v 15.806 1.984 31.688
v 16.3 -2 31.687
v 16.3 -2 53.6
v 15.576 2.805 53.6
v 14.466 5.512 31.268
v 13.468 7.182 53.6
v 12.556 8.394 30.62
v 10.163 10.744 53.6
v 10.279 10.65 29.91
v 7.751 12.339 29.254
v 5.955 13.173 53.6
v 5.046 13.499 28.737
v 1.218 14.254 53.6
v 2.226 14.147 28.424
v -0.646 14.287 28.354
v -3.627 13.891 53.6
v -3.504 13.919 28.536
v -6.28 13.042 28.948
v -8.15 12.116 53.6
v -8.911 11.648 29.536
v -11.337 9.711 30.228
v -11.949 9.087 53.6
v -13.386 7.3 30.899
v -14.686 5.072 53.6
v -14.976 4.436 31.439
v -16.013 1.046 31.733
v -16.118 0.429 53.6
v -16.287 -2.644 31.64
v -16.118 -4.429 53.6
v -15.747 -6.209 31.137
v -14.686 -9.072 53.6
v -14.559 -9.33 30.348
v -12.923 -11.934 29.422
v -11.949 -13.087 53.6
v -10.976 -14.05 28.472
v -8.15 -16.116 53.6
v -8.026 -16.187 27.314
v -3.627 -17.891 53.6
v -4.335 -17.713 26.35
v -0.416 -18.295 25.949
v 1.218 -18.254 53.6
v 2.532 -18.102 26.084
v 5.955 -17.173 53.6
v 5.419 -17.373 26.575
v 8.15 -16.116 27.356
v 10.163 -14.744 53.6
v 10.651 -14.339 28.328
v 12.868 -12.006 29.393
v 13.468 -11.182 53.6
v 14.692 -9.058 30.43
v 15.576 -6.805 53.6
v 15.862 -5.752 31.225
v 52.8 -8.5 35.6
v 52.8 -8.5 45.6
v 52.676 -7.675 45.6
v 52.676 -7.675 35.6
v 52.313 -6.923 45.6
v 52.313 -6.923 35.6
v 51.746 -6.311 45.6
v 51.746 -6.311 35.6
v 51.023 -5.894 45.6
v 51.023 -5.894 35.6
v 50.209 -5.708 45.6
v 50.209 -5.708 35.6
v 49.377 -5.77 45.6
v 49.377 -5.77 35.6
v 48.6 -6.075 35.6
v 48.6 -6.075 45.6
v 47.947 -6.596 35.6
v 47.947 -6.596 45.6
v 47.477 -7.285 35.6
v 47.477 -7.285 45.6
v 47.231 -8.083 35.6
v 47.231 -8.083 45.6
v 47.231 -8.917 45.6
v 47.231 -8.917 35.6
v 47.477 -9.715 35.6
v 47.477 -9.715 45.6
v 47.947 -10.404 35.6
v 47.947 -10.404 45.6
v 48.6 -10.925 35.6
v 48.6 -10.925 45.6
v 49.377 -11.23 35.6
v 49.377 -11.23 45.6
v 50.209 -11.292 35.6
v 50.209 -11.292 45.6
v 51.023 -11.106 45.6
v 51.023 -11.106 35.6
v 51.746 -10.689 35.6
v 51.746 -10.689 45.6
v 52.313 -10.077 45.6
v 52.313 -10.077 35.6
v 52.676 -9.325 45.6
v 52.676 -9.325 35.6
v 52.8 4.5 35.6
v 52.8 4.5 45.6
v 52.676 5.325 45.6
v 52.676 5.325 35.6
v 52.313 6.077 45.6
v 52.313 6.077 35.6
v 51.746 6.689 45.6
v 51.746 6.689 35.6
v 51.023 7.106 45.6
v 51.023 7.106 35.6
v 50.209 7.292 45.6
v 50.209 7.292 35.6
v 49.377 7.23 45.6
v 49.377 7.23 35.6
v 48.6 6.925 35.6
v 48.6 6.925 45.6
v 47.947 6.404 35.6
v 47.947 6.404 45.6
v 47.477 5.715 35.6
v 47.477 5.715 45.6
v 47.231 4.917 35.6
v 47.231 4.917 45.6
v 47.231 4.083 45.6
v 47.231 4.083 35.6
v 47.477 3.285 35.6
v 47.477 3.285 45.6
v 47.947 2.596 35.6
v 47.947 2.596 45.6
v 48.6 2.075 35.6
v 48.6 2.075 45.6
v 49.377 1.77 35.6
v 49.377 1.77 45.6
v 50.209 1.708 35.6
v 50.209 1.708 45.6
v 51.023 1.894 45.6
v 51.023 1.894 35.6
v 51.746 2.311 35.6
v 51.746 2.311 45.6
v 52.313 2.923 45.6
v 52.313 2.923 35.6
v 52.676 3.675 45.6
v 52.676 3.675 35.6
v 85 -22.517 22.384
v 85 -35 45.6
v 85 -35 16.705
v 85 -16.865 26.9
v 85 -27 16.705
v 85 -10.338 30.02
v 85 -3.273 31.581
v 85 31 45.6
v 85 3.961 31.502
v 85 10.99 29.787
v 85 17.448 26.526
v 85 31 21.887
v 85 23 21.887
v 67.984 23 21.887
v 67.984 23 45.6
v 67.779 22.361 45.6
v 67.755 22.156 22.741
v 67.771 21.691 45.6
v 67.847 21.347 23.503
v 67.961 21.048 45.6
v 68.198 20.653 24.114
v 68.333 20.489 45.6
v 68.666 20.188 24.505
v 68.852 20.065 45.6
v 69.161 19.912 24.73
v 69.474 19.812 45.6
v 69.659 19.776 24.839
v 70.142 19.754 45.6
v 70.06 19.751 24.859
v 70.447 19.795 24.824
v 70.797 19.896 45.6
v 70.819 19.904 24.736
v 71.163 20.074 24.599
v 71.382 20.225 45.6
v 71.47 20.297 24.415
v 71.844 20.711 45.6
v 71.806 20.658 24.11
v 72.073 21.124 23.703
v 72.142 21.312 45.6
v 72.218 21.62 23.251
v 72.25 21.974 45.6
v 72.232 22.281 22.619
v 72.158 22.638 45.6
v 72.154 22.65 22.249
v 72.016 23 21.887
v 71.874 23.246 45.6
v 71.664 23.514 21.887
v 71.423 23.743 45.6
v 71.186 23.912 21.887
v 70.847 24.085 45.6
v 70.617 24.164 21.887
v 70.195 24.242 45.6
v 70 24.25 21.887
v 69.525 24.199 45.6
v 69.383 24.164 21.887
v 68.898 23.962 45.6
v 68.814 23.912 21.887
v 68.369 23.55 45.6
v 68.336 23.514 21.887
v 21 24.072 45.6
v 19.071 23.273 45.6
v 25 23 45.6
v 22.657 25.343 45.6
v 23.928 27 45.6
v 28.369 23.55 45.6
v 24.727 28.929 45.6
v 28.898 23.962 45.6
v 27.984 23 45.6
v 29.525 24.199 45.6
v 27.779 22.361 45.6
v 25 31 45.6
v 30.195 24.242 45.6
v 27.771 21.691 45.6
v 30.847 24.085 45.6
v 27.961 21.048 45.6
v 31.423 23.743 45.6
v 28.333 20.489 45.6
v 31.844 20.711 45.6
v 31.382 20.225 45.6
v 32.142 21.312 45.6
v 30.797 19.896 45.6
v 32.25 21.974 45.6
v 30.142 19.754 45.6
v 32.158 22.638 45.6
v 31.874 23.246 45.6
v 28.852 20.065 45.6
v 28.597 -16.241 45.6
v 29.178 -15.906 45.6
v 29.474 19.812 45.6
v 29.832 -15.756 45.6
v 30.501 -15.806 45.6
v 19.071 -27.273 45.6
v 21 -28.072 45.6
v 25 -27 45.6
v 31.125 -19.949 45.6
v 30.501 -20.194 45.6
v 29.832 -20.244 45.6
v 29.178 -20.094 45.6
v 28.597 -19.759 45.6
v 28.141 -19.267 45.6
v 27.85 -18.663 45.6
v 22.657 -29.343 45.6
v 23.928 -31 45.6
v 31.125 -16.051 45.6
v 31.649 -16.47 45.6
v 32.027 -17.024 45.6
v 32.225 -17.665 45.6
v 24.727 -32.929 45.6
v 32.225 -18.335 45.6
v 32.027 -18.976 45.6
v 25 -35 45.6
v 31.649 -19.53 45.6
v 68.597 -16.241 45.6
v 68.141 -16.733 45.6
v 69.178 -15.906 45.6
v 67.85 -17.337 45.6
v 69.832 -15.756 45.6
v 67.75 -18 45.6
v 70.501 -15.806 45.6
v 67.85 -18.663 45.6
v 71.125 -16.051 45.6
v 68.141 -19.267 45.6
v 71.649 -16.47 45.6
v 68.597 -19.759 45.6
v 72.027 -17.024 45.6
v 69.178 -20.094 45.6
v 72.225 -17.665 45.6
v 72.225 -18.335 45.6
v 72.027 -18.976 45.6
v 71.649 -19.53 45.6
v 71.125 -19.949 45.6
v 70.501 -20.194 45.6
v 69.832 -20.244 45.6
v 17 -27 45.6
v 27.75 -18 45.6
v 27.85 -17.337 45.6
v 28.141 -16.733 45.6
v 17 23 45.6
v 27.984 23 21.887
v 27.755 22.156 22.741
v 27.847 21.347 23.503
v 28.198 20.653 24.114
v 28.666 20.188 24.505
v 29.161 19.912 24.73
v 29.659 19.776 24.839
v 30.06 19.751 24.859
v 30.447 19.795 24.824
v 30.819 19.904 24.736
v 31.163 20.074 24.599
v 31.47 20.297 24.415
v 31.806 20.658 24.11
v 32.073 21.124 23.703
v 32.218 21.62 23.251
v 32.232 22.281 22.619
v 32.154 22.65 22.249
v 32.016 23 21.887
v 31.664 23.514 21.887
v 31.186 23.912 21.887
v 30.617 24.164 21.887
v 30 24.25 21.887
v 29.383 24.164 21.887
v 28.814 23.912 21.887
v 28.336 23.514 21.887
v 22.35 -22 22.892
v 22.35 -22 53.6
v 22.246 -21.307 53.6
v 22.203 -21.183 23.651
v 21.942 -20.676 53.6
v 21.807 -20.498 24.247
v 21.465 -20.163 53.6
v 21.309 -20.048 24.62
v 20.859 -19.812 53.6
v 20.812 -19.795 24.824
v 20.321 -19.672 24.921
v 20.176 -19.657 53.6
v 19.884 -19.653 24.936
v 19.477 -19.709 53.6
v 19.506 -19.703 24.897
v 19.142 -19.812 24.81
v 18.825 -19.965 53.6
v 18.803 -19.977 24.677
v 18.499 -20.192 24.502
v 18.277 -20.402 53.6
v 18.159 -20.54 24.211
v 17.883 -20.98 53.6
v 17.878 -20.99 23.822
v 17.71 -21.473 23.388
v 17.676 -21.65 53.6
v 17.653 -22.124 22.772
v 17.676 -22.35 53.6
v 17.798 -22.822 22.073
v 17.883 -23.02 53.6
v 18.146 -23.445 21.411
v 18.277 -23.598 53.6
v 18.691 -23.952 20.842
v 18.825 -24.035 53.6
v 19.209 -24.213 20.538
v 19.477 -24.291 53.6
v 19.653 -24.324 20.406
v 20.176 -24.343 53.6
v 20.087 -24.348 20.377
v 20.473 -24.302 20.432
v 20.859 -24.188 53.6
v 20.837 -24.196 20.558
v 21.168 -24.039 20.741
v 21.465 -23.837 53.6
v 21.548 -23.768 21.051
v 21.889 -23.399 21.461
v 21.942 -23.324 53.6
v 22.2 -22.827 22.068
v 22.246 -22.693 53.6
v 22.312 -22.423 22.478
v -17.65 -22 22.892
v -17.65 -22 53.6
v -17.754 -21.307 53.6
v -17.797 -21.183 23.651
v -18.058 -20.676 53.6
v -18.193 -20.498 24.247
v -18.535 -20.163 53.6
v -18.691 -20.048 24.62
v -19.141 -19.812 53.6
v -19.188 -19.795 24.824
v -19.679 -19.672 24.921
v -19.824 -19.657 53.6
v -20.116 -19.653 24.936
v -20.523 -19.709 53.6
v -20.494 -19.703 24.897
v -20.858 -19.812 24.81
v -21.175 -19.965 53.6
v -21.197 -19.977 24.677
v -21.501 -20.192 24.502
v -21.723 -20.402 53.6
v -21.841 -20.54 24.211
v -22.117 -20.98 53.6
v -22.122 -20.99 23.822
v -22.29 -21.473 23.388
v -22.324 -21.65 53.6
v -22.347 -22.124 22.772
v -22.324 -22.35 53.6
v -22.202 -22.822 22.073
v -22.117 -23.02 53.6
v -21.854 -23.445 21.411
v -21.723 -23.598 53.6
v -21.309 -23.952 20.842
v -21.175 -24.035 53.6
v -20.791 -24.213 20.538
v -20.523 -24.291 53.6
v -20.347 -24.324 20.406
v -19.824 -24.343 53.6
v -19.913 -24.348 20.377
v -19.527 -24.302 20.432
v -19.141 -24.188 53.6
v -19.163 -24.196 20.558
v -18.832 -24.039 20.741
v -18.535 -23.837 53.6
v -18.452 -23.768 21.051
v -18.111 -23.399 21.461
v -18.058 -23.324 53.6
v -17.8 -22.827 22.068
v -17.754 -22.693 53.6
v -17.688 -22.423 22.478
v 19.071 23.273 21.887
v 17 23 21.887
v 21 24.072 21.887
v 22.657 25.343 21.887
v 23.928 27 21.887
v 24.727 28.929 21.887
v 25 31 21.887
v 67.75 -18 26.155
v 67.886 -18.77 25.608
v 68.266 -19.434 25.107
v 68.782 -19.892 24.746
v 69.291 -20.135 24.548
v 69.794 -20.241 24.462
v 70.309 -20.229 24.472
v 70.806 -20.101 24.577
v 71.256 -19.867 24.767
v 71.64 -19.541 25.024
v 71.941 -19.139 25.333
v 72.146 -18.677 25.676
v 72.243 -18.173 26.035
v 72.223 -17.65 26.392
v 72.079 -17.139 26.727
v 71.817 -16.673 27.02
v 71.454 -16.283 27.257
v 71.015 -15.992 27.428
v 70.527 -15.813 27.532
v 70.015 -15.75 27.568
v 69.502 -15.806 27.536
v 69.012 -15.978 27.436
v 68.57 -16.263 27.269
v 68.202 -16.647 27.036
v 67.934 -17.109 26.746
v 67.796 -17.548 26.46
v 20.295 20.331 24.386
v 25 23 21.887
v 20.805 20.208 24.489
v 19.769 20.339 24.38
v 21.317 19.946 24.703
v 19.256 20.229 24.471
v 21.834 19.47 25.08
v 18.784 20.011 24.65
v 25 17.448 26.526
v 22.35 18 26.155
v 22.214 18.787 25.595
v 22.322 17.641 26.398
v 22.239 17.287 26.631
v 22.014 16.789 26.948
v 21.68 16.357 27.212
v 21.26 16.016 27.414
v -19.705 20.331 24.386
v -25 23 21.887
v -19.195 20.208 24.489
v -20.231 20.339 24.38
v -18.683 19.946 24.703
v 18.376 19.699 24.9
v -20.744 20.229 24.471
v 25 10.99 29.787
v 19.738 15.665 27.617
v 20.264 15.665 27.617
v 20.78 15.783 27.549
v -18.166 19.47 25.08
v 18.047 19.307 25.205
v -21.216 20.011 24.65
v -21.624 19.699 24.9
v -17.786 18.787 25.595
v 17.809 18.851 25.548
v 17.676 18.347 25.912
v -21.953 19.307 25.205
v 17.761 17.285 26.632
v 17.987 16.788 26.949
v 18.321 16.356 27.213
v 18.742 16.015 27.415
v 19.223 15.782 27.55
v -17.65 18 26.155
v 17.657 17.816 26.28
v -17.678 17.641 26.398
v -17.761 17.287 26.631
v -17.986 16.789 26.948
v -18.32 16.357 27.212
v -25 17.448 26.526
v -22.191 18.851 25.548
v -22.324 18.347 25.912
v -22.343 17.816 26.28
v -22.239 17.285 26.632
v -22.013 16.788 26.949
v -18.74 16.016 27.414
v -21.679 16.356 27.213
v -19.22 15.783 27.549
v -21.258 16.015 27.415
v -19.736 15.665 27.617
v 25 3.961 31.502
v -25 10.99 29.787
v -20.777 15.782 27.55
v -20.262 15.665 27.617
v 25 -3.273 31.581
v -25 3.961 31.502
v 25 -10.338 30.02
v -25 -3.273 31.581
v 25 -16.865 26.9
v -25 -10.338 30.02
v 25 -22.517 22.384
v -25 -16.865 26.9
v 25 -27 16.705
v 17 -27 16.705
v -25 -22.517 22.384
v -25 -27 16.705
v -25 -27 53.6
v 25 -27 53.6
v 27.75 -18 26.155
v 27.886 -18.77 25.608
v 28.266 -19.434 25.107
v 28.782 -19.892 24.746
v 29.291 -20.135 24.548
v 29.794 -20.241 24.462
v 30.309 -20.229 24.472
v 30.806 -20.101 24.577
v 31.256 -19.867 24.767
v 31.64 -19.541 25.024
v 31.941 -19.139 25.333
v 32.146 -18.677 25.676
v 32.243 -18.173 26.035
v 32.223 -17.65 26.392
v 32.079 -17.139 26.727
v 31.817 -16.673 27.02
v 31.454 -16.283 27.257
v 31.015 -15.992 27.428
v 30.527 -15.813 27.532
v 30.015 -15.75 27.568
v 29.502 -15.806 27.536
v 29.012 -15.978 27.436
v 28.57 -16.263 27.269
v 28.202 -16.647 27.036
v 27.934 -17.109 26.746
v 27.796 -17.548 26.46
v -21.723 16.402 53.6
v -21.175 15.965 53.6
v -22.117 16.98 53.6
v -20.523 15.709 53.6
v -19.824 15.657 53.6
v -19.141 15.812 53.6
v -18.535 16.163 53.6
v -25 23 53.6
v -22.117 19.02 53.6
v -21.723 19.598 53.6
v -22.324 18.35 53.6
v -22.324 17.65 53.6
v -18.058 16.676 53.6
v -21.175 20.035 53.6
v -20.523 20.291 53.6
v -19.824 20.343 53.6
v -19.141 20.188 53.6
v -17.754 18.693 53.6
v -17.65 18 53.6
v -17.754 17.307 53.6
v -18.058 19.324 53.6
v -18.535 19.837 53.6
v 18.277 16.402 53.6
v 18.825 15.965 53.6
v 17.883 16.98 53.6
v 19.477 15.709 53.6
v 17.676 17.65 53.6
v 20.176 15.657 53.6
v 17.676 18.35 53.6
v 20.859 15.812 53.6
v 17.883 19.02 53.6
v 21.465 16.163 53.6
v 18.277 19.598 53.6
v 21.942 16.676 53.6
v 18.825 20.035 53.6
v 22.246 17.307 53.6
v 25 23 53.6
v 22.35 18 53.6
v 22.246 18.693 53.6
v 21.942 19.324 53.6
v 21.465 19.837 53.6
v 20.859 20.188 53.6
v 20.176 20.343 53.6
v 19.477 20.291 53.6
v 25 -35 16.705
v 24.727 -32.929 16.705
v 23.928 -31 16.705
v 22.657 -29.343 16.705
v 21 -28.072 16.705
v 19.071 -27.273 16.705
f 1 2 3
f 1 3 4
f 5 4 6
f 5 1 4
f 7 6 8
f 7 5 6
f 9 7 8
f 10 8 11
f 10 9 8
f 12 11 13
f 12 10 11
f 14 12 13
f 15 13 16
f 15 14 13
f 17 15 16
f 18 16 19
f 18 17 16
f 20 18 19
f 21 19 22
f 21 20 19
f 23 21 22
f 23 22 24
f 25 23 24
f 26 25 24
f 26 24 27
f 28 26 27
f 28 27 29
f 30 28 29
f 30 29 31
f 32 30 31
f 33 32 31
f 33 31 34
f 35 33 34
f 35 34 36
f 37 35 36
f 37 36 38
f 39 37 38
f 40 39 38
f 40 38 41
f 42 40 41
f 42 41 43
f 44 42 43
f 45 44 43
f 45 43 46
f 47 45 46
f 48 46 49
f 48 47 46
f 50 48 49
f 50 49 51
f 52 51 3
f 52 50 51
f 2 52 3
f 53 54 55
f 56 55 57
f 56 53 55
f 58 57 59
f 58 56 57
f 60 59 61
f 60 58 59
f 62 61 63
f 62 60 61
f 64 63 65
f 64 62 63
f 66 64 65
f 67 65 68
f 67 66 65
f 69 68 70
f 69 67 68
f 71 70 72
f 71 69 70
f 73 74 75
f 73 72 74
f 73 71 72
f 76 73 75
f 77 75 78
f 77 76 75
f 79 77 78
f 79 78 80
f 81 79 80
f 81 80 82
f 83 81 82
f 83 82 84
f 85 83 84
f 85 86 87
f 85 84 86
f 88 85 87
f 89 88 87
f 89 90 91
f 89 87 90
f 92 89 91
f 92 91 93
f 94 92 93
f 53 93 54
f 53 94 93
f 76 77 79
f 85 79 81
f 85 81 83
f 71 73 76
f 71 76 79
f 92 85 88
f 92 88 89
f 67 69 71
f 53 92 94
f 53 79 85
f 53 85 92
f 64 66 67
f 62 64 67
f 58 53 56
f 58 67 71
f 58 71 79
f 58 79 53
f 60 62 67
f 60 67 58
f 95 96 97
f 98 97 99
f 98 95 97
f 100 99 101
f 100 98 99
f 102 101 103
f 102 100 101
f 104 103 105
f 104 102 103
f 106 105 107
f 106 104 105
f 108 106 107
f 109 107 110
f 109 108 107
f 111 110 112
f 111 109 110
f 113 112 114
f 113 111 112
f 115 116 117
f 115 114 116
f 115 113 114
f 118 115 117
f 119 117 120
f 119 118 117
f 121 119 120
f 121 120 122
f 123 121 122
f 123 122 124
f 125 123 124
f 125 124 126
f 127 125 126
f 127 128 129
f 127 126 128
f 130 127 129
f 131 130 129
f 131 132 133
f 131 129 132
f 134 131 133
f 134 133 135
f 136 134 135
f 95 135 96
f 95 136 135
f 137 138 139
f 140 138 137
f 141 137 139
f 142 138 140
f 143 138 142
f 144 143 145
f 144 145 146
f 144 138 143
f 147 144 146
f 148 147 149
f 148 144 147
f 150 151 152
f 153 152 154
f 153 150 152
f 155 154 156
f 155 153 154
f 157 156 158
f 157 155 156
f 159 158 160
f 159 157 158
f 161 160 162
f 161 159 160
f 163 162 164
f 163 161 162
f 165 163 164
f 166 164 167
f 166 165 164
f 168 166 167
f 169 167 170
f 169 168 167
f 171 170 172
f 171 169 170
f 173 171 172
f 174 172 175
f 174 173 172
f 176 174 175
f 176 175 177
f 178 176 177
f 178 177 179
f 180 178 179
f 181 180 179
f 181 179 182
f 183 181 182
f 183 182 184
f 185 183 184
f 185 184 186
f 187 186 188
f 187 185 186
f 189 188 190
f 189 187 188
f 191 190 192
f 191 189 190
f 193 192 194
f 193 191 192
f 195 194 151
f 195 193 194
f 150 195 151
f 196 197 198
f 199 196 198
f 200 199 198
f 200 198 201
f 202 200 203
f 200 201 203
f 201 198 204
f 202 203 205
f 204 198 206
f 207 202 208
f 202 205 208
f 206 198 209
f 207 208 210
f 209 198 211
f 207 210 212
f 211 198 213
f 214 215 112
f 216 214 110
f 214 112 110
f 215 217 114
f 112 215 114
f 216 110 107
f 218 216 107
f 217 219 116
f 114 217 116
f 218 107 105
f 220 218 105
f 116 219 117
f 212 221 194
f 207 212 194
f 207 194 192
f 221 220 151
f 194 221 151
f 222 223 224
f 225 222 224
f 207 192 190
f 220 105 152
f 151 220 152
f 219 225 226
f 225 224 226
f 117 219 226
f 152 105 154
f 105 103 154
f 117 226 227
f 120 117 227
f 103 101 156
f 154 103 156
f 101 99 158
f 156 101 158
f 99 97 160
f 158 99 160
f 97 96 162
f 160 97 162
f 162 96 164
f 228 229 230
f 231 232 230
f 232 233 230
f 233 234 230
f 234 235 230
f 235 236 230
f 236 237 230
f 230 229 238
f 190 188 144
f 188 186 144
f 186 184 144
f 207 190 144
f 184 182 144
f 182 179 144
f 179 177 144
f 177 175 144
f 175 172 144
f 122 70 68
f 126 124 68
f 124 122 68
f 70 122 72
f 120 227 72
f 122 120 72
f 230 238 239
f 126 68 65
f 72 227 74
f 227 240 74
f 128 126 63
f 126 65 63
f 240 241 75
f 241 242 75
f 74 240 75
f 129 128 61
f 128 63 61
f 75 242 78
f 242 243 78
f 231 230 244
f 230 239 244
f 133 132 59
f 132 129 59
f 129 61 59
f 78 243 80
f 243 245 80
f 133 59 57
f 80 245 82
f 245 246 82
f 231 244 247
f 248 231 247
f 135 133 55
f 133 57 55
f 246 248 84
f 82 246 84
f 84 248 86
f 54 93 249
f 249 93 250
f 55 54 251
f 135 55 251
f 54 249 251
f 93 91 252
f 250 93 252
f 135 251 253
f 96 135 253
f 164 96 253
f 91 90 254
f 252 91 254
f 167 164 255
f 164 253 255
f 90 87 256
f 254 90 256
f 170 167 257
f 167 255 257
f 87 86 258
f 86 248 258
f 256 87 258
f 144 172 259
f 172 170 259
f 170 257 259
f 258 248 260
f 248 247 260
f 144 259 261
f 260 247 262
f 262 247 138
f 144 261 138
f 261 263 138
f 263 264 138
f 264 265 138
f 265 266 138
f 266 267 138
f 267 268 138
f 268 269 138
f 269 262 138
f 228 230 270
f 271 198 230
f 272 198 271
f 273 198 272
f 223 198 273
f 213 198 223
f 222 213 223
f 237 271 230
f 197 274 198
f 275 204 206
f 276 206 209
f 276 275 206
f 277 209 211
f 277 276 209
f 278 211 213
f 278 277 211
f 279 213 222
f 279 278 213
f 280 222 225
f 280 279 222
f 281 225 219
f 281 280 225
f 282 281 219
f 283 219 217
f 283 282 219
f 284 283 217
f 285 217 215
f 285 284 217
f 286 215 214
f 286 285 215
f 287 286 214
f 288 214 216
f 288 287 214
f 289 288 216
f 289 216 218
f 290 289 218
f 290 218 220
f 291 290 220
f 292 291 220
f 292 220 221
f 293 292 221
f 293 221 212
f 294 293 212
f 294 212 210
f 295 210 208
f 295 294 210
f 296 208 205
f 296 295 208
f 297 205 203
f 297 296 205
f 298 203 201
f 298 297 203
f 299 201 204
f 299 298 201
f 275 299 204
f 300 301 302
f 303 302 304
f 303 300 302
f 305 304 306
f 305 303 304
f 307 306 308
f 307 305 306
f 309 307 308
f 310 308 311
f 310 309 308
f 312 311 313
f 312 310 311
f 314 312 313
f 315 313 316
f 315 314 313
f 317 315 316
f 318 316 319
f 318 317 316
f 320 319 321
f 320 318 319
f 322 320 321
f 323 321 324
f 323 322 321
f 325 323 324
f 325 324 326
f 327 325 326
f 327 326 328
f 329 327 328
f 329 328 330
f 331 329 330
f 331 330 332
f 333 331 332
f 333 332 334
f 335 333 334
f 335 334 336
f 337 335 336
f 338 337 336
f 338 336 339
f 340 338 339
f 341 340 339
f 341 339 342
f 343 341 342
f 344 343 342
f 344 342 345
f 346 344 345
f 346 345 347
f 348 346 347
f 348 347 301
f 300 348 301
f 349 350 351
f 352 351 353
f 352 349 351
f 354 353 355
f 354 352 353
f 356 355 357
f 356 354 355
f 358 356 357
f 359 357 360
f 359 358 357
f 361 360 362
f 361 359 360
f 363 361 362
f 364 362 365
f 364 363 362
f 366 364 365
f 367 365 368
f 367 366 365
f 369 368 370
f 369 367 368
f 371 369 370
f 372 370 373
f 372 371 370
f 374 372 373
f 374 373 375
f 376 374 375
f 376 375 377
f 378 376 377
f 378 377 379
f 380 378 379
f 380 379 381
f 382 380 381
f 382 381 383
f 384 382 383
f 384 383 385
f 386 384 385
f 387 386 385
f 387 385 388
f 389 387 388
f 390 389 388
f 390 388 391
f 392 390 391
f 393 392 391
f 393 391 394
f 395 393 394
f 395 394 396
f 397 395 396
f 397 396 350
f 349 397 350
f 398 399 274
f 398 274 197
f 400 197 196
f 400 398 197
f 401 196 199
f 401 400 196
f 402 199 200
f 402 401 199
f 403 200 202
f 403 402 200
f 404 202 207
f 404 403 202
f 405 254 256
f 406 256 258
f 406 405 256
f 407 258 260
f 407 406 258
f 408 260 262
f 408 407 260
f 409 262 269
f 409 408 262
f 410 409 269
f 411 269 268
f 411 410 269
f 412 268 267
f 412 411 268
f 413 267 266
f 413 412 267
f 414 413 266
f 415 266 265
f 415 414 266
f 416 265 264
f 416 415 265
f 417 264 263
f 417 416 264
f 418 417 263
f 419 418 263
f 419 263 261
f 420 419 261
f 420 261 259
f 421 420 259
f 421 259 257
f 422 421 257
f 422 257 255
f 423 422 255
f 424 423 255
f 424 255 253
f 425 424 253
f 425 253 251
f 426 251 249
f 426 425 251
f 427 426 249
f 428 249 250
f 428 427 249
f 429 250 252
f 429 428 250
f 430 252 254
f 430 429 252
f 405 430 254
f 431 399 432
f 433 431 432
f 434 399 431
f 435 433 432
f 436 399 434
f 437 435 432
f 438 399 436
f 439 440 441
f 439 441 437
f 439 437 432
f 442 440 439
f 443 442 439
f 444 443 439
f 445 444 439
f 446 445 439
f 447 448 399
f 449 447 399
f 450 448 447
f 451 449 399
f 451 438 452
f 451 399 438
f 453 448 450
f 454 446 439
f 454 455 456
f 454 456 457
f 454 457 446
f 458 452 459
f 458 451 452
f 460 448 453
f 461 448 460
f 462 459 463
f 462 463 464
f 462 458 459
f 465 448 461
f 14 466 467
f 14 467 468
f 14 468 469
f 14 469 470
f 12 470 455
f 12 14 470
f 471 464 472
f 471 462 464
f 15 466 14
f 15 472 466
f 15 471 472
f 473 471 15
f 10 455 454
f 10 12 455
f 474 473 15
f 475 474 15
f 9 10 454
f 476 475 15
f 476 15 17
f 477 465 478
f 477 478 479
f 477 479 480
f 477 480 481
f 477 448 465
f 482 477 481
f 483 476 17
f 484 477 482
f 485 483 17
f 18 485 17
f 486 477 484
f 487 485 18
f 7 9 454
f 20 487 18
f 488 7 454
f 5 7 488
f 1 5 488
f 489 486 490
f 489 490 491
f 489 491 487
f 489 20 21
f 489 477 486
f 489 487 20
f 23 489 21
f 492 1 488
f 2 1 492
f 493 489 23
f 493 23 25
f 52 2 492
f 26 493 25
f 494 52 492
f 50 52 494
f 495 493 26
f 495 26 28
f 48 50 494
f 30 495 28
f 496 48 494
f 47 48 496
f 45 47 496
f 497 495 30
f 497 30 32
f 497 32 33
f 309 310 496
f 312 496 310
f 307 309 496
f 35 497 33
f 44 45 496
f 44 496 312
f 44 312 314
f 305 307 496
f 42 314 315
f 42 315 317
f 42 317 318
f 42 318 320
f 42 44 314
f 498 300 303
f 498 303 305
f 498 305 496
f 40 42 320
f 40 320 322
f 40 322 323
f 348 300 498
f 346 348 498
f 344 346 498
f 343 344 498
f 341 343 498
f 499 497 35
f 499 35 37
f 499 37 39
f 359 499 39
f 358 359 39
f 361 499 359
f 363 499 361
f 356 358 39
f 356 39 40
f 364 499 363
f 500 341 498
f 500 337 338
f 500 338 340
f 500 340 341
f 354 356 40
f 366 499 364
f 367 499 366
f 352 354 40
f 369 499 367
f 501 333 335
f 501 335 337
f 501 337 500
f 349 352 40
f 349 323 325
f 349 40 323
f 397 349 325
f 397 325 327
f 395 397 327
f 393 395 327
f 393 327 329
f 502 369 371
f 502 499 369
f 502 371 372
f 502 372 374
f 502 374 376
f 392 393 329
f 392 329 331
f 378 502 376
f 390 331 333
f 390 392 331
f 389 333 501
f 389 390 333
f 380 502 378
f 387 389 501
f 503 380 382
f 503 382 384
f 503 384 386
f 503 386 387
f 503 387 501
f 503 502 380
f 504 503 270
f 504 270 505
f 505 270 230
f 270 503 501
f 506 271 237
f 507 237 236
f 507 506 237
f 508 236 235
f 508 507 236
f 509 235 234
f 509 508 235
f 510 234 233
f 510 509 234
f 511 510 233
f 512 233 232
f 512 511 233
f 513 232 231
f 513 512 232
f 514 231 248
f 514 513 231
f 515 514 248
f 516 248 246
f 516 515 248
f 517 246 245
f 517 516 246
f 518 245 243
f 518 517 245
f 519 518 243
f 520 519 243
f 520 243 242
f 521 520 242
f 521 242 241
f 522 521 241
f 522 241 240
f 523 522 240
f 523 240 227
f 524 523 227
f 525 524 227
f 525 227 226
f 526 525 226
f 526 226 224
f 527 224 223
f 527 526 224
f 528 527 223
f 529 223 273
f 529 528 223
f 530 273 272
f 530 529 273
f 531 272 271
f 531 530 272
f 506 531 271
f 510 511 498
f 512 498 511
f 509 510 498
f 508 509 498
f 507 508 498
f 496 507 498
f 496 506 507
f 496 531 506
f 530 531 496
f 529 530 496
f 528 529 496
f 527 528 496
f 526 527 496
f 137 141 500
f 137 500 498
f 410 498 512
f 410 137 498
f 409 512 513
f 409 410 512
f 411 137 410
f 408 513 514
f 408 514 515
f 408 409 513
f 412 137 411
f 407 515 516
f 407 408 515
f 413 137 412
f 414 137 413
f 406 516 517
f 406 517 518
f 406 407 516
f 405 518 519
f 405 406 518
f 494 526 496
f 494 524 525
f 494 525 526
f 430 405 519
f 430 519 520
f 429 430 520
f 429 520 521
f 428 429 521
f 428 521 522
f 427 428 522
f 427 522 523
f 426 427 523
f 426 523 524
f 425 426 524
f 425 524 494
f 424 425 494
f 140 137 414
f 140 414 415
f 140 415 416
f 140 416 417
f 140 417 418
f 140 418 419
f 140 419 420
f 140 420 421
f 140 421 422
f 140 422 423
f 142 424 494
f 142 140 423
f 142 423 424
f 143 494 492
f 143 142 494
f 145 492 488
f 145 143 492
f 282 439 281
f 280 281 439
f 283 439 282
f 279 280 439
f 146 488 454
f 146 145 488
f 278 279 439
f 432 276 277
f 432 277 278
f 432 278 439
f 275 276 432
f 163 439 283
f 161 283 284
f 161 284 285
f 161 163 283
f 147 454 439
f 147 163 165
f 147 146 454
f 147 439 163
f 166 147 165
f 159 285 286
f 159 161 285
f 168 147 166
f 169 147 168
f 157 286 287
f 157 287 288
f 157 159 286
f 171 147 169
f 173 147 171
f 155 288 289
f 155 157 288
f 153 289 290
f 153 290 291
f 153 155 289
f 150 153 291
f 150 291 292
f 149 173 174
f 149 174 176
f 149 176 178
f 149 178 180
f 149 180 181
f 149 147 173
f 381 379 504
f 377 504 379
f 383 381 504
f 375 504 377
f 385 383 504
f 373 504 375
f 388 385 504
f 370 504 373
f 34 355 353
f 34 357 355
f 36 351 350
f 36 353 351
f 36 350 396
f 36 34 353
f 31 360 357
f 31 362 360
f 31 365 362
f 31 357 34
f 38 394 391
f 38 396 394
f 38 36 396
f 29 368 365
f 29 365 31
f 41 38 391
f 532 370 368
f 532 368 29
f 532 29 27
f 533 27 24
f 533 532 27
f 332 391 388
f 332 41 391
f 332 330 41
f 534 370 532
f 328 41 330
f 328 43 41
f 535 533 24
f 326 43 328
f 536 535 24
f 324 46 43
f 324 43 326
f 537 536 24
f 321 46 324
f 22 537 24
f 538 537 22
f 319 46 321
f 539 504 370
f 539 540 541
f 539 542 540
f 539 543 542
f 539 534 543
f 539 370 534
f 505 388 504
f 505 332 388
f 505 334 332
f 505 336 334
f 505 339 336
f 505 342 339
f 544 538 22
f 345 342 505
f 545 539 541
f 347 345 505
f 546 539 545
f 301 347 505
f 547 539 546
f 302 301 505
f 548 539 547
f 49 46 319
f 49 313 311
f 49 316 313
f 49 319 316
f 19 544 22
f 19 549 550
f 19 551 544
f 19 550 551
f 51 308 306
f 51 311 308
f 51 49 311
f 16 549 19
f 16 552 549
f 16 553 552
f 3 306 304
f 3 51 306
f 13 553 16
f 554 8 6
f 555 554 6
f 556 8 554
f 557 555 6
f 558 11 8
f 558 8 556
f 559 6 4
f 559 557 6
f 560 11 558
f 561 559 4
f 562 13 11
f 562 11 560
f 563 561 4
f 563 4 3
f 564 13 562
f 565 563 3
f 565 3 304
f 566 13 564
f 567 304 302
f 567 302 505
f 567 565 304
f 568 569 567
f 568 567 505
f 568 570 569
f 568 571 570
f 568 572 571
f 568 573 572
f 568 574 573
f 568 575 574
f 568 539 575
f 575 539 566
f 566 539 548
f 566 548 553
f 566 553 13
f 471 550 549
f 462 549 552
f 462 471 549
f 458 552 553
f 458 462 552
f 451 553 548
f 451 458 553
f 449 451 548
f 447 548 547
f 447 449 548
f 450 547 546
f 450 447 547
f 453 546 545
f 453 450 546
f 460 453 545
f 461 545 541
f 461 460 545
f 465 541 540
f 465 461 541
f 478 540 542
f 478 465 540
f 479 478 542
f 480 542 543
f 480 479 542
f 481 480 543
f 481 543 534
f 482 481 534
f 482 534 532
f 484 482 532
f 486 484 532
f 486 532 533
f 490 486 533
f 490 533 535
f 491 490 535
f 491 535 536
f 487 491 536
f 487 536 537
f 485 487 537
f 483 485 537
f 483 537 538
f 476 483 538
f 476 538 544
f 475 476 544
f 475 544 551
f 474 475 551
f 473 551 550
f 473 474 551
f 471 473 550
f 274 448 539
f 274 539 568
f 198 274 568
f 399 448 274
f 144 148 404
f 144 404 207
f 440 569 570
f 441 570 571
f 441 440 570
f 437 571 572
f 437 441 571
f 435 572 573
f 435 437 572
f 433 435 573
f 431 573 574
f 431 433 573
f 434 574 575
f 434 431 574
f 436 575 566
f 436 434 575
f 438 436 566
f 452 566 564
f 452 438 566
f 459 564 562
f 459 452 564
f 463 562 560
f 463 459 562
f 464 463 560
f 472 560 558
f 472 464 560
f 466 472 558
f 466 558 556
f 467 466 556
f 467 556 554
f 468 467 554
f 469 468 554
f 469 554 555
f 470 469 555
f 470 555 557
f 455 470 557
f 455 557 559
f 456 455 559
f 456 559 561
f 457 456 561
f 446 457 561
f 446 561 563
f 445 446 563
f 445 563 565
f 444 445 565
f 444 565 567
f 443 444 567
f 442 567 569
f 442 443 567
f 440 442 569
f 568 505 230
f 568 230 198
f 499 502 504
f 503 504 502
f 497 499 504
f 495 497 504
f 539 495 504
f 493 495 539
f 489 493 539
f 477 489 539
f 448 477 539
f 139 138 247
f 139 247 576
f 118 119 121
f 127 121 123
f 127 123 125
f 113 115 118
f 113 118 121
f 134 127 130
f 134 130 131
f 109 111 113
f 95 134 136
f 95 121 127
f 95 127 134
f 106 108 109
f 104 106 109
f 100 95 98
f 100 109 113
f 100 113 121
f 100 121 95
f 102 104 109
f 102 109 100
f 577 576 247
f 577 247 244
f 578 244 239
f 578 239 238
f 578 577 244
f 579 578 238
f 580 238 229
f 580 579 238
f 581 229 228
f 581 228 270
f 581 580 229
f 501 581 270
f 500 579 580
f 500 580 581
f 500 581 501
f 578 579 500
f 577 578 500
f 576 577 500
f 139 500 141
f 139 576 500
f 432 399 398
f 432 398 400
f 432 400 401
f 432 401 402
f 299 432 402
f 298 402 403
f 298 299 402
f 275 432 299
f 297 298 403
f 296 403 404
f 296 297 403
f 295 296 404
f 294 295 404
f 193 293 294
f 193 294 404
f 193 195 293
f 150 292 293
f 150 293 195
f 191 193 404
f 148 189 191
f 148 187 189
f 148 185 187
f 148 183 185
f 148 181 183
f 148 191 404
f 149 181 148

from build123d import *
from build123d.topology import SkipClean

# Parameters (mm, degrees)
SKETCH1_W               = 50
SKETCH1_H               = 50
SKETCH1_R               = 16.3
SKETCH1_R_2             = 2.35
BOSS_EXTRUDE1_DEPTH     = 53.6
CUT_EXTRUDE1_DEPTH      = 66.015075175
CUT_EXTRUDE1_DEPTH_BACK = 66.015075175
SKETCH2_R               = 31.75
BOSS_EXTRUDE3_START     = 60
BOSS_EXTRUDE3_DEPTH     = 60
SKETCH12_W              = 60
SKETCH12_H              = 66
CUT_EXTRUDE7_DEPTH      = 8
CUT_EXTRUDE5_DEPTH      = 107.409398132
CUT_EXTRUDE5_DEPTH_BACK = 107.409398132
SKETCH9_R               = 2.25
CUT_EXTRUDE6_DEPTH      = 97.358246028
CUT_EXTRUDE6_DEPTH_BACK = 10
SKETCH10_R              = 2.8
FILLET1_R               = 8


with BuildPart() as part:
    # Sketch1 → Boss-Extrude1 (new body)
    with BuildSketch(Plane.XY):
        with Locations((0, -2)):
            Rectangle(SKETCH1_W, SKETCH1_H)
        with Locations((0, -2)):
            Circle(SKETCH1_R, mode=Mode.SUBTRACT)
        with Locations((-20, 18)):
            Circle(SKETCH1_R_2, mode=Mode.SUBTRACT)
        with Locations((20, 18)):
            Circle(SKETCH1_R_2, mode=Mode.SUBTRACT)
        with Locations((20, -22)):
            Circle(SKETCH1_R_2, mode=Mode.SUBTRACT)
        with Locations((-20, -22)):
            Circle(SKETCH1_R_2, mode=Mode.SUBTRACT)
    extrude(amount=BOSS_EXTRUDE1_DEPTH)

    # Sketch2 → Cut-Extrude1 (cut, two sides: drawn at the far end of the back side and taken through both)
    with BuildSketch(Plane(origin=(0, 0, 0), x_dir=(0, 0, -1), z_dir=(1, 0, 0)).offset(-CUT_EXTRUDE1_DEPTH_BACK)):
        Circle(SKETCH2_R)
    extrude(amount=CUT_EXTRUDE1_DEPTH + CUT_EXTRUDE1_DEPTH_BACK, mode=Mode.SUBTRACT)

    # Sketch4 → Boss-Extrude3 (add)
    with SkipClean():  # the faces are left unmerged after this step: merging them gives an invalid solid
        with BuildSketch(Plane(origin=(25, 0, 0), x_dir=(0, 0, -1), z_dir=(1, 0, 0)).offset(BOSS_EXTRUDE3_START)):
            with BuildLine():
                Line((-53.6, -27), (-53.6, -35))
                Line((-53.6, -35), (-16.705163872, -35))
                Line((-16.705163872, -35), (-16.705163872, -27))
                ThreePointArc((-16.705163872, -27), (-31.580822619, -3.273246506), (-21.887496431, 23))
                Line((-21.887496431, 23), (-21.887496431, 31))
                Line((-21.887496431, 31), (-53.6, 31))
                Line((-53.6, 31), (-53.6, 23))
                Line((-53.6, 23), (-53.6, -27))
            make_face()
        extrude(amount=-BOSS_EXTRUDE3_DEPTH)

    # Sketch12 → Cut-Extrude7 (cut)
    with SkipClean():  # the faces are left unmerged after this step: merging them gives an invalid solid
        with BuildSketch(Plane.XY.offset(53.6)):
            with Locations((55, -2)):
                Rectangle(SKETCH12_W, SKETCH12_H)
        extrude(amount=-CUT_EXTRUDE7_DEPTH, mode=Mode.SUBTRACT)

    # Sketch9 → Cut-Extrude5 (cut, two sides: drawn at the far end of the back side and taken through both)
    with SkipClean():  # the faces are left unmerged after this step: merging them gives an invalid solid
        with BuildSketch(Plane.XY.offset(-CUT_EXTRUDE5_DEPTH_BACK)):
            with Locations(Location((30, 22, 0), (0, 0, 153.612200039))):
                Circle(SKETCH9_R)
            with Locations(Location((70, 22, 0), (0, 0, 153.612200039))):
                Circle(SKETCH9_R)
            with Locations(Location((70, -18, 0), (0, 0, 180))):
                Circle(SKETCH9_R)
            with Locations(Location((30, -18, 0), (0, 0, 180))):
                Circle(SKETCH9_R)
        extrude(amount=CUT_EXTRUDE5_DEPTH + CUT_EXTRUDE5_DEPTH_BACK, mode=Mode.SUBTRACT)

    # Sketch10 → Cut-Extrude6 (cut, two sides: drawn at the far end of the back side and taken through both)
    with SkipClean():  # the faces are left unmerged after this step: merging them gives an invalid solid
        with BuildSketch(Plane.XY.offset(45.6).offset(-CUT_EXTRUDE6_DEPTH_BACK)):
            with Locations((50, 4.5)):
                Circle(SKETCH10_R)
            with Locations((50, -8.5)):
                Circle(SKETCH10_R)
        extrude(amount=CUT_EXTRUDE6_DEPTH + CUT_EXTRUDE6_DEPTH_BACK, mode=Mode.SUBTRACT)

    # Fillet1
    # the kernel refuses this fillet: 8 mm, written as the material it adds along each edge
    with BuildSketch(Plane(origin=(25, 23, 21.887496431), x_dir=(-1, 0, 0), z_dir=(0, 0, 1))) as fillet1_piece_1:
        with BuildLine():
            CenterArc((FILLET1_R, -FILLET1_R), FILLET1_R, 90, 90)
            Line((0, -FILLET1_R), (0, 0))
            Line((0, 0), (FILLET1_R, 0))
        make_face()
    extrude(amount=23.712503569)
    with BuildSketch(Plane(origin=(25, -27, 16.705163872), x_dir=(-1, 0, 0), z_dir=(0, 0, 1))) as fillet1_piece_2:
        with BuildLine():
            CenterArc((FILLET1_R, FILLET1_R), FILLET1_R, 180, 90)
            Line((0, FILLET1_R), (0, 0))
            Line((0, 0), (FILLET1_R, 0))
        make_face()
    extrude(amount=28.894836128)


solid = part.part
